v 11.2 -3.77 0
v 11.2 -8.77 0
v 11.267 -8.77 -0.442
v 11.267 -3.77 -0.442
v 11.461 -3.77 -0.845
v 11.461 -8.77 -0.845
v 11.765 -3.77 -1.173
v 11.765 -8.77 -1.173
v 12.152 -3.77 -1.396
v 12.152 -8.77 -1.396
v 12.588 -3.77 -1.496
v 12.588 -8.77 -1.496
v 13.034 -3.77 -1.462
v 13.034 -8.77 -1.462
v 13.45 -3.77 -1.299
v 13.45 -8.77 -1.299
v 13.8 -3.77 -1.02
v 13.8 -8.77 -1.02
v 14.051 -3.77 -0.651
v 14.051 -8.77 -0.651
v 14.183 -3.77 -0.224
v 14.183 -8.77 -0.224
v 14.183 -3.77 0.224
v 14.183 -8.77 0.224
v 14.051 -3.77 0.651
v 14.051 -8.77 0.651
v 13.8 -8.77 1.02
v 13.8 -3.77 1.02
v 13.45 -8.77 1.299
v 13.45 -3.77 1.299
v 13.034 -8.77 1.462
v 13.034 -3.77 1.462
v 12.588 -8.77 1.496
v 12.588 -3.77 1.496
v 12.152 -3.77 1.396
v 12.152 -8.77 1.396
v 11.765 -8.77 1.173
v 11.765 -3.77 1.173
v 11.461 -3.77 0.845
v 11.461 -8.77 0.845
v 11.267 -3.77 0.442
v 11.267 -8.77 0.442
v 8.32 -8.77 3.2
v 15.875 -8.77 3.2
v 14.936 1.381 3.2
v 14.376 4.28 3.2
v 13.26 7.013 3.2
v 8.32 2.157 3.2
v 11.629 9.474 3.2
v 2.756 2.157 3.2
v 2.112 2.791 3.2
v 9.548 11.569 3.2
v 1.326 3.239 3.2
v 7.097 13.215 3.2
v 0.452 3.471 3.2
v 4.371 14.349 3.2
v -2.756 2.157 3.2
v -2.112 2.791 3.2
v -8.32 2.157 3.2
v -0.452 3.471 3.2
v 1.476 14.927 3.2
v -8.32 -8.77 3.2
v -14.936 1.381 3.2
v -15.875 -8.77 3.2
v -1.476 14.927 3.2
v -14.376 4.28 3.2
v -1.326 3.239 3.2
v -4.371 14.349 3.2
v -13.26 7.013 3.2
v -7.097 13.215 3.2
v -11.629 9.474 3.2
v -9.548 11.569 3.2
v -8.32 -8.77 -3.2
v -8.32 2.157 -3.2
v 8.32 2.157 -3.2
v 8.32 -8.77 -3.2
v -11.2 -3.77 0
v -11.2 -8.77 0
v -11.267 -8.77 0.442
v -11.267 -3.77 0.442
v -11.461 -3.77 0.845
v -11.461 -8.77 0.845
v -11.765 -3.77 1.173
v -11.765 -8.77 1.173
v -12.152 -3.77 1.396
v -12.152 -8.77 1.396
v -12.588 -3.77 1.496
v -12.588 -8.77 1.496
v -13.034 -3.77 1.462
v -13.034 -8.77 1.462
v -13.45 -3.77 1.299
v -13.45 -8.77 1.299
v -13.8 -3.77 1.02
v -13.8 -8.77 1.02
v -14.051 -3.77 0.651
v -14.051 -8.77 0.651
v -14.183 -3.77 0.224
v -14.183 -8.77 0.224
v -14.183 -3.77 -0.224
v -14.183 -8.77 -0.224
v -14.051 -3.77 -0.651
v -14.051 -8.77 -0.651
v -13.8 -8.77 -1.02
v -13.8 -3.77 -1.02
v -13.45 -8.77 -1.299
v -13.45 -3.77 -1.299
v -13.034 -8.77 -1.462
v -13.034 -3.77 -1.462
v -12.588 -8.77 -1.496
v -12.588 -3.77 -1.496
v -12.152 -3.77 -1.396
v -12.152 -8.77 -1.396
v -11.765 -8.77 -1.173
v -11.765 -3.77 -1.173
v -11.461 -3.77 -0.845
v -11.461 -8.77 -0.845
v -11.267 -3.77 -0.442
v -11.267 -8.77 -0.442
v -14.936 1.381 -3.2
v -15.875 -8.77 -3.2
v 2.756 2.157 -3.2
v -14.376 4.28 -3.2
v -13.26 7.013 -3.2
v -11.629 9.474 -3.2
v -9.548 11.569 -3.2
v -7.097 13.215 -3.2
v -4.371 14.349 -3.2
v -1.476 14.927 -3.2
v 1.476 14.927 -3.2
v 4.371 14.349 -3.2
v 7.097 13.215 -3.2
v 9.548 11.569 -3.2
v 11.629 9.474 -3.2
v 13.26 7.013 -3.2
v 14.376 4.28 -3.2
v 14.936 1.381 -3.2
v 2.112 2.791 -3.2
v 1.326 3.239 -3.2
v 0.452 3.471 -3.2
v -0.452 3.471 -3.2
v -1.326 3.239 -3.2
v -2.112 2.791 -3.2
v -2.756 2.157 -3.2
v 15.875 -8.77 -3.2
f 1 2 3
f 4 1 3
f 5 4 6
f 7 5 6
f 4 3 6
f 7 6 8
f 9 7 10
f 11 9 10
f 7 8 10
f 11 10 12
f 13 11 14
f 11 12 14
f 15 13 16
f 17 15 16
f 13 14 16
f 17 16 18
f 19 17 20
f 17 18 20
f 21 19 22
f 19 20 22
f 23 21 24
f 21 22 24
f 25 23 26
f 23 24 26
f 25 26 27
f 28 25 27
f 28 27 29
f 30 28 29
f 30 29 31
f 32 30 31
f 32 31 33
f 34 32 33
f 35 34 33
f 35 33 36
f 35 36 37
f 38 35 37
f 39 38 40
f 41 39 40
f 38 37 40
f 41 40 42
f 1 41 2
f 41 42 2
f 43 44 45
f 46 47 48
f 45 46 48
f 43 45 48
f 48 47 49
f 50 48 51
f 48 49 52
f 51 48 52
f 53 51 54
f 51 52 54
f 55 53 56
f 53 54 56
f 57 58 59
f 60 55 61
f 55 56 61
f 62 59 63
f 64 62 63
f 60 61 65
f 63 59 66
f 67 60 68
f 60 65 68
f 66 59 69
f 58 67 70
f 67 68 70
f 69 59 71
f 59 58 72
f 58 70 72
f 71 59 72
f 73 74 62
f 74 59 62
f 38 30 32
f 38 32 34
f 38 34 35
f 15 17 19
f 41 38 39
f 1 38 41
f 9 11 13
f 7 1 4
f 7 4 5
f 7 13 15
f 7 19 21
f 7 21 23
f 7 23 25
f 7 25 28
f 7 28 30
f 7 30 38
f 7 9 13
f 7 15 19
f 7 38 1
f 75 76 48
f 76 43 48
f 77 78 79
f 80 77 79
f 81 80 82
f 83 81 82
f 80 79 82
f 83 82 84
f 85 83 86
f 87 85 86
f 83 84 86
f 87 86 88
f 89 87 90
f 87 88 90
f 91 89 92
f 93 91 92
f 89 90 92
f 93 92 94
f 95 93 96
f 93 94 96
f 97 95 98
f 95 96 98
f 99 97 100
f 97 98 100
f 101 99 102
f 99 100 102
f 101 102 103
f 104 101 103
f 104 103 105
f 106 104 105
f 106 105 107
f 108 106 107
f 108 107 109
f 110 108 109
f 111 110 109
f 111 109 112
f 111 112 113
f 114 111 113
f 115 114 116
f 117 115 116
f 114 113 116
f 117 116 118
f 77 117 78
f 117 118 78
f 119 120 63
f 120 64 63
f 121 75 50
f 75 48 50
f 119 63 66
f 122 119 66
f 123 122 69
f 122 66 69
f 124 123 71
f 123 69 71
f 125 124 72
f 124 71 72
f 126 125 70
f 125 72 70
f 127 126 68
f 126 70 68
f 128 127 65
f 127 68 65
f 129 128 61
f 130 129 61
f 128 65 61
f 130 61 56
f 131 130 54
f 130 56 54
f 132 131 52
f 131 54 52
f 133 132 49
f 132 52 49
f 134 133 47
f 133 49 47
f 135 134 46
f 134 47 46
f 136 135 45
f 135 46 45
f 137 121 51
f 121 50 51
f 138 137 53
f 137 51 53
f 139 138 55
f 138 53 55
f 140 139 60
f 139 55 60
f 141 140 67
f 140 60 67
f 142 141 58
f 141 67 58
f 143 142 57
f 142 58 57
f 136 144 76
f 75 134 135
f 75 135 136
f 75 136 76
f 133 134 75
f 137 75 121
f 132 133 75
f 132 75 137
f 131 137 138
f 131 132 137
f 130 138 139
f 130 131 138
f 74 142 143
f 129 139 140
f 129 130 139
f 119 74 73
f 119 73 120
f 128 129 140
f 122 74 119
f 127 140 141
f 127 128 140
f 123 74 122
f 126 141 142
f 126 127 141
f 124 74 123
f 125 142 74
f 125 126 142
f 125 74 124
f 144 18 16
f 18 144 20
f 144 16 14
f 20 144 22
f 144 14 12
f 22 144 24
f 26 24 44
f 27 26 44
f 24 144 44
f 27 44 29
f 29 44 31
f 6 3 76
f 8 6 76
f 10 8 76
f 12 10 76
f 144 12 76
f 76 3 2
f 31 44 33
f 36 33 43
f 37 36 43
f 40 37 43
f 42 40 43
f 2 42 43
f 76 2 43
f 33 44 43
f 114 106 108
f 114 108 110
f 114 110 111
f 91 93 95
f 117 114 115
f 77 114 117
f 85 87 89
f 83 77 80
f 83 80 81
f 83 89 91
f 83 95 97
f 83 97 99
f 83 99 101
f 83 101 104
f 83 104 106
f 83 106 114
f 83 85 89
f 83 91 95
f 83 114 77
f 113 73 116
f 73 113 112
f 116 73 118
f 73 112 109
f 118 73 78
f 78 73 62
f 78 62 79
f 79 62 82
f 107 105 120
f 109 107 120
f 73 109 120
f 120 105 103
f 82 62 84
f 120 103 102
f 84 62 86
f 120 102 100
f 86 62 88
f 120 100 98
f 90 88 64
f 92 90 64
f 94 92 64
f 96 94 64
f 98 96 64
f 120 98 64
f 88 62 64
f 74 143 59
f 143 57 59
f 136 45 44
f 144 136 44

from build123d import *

# Parameters (mm, degrees)
SALIENTE_EXTRUIR1_DEPTH = 3.2
CROQUIS2_R              = 1.5
CORTAR_EXTRUIR1_DEPTH   = 5


with BuildPart() as part:
    # Croquis1 → Saliente-Extruir1 (new, symmetric)
    with BuildSketch(Plane.XY):
        with BuildLine():
            Line((15.875, -8.77), (8.32, -8.77))
            Line((8.32, -8.77), (8.32, 2.157309855))
            Line((8.32, 2.157309855), (2.756086753, 2.157309855))
            ThreePointArc((2.756086753, 2.157309855), (0, 3.5), (-2.756086753, 2.157309855))
            Line((-2.756086753, 2.157309855), (-8.32, 2.157309855))
            Line((-8.32, 2.157309855), (-8.32, -8.77))
            Line((-8.32, -8.77), (-15.875, -8.77))
            Line((-15.875, -8.77), (-14.93627212, 1.381222339))
            ThreePointArc((-14.93627212, 1.381222339), (0, 15), (14.93627212, 1.381222339))
            Line((14.93627212, 1.381222339), (15.875, -8.77))
        make_face()
    extrude(amount=SALIENTE_EXTRUIR1_DEPTH, both=True)

    # Croquis2 → Cortar-Extruir1 (cut)
    with BuildSketch(Plane.XZ.offset(8.77)):
        with Locations((-12.7, 0)):
            Circle(CROQUIS2_R)
        with Locations(Location((12.7, 0, 0), (0, 0, 180))):
            Circle(CROQUIS2_R)
    extrude(amount=-CORTAR_EXTRUIR1_DEPTH, mode=Mode.SUBTRACT)


solid = part.part
